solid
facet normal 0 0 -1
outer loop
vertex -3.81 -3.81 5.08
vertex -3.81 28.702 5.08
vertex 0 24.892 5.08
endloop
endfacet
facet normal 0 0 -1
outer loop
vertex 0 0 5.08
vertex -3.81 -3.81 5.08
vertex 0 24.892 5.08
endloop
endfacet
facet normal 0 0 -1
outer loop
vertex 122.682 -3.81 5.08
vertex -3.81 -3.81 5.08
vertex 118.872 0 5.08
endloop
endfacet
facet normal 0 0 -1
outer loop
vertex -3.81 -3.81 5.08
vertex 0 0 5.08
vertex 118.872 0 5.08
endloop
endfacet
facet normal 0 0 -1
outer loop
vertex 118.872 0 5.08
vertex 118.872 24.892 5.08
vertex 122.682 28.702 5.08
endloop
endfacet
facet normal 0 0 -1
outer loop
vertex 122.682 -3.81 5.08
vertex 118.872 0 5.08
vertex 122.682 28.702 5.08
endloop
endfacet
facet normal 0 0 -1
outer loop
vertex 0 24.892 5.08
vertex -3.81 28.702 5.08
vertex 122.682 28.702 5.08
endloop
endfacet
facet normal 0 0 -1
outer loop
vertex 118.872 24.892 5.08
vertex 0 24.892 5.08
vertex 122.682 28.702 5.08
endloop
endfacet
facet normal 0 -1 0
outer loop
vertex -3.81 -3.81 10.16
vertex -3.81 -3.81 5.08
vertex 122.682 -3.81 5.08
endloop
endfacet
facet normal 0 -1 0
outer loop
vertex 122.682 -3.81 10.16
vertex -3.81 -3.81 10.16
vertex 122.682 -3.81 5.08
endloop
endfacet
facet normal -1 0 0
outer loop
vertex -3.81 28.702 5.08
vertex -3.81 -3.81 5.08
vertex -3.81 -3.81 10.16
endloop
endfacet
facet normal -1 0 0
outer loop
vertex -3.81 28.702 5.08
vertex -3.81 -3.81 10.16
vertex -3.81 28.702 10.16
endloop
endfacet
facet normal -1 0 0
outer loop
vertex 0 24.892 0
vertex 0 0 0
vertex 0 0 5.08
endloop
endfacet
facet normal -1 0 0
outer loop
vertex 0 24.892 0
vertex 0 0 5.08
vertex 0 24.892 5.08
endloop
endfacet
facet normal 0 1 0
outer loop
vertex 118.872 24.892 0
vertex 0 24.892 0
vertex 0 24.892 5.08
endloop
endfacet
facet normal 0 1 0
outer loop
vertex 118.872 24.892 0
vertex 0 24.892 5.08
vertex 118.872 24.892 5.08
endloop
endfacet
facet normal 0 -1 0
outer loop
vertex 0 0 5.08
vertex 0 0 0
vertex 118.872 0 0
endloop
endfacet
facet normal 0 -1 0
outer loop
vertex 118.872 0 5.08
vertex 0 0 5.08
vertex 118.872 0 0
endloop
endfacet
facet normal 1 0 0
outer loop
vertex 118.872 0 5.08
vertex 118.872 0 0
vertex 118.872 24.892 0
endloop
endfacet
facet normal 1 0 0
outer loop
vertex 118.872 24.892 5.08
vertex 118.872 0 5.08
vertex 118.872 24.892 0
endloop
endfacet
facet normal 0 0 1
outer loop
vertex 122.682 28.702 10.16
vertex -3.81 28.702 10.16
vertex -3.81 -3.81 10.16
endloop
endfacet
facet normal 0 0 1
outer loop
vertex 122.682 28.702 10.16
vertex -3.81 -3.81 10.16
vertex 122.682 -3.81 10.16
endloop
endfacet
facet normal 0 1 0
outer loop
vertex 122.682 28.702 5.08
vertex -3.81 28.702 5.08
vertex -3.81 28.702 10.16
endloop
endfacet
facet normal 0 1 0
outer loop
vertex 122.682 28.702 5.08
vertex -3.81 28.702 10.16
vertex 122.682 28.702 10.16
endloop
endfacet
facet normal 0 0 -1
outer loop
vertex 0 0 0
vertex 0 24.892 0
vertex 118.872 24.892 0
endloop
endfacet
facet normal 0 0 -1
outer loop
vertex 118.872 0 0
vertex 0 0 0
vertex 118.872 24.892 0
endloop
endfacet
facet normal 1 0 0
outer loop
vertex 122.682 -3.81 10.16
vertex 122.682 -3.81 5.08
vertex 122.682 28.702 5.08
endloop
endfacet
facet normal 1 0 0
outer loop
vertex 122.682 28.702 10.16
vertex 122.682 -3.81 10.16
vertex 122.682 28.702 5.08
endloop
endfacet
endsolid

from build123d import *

# Parameters (mm, degrees)
F0_W     = 118.872
F0_H     = 24.892
F1_DEPTH = 5.08
F2_W     = 126.492
F2_H     = 32.512
F2_W_2   = 118.872
F2_H_2   = 24.892
F3_DEPTH = 5.08


with BuildPart() as f1:
    # F0 (on Top) → F1 (new body)
    with BuildSketch(Plane.XY):
        with Locations((59.436, 12.446)):
            Rectangle(F0_W, F0_H)
    extrude(amount=F1_DEPTH)

    # F2 (on face) → F3 (join)
    with BuildSketch(Plane.XY.offset(5.08)):
        with Locations((59.436, 12.446)):
            Rectangle(F2_W, F2_H)
        with Locations((59.436, 12.446)):
            Rectangle(F2_W_2, F2_H_2, mode=Mode.SUBTRACT)
        with Locations((59.436, 12.446)):
            Rectangle(F2_W_2, F2_H_2)
    extrude(amount=F3_DEPTH)


solid = f1.part
